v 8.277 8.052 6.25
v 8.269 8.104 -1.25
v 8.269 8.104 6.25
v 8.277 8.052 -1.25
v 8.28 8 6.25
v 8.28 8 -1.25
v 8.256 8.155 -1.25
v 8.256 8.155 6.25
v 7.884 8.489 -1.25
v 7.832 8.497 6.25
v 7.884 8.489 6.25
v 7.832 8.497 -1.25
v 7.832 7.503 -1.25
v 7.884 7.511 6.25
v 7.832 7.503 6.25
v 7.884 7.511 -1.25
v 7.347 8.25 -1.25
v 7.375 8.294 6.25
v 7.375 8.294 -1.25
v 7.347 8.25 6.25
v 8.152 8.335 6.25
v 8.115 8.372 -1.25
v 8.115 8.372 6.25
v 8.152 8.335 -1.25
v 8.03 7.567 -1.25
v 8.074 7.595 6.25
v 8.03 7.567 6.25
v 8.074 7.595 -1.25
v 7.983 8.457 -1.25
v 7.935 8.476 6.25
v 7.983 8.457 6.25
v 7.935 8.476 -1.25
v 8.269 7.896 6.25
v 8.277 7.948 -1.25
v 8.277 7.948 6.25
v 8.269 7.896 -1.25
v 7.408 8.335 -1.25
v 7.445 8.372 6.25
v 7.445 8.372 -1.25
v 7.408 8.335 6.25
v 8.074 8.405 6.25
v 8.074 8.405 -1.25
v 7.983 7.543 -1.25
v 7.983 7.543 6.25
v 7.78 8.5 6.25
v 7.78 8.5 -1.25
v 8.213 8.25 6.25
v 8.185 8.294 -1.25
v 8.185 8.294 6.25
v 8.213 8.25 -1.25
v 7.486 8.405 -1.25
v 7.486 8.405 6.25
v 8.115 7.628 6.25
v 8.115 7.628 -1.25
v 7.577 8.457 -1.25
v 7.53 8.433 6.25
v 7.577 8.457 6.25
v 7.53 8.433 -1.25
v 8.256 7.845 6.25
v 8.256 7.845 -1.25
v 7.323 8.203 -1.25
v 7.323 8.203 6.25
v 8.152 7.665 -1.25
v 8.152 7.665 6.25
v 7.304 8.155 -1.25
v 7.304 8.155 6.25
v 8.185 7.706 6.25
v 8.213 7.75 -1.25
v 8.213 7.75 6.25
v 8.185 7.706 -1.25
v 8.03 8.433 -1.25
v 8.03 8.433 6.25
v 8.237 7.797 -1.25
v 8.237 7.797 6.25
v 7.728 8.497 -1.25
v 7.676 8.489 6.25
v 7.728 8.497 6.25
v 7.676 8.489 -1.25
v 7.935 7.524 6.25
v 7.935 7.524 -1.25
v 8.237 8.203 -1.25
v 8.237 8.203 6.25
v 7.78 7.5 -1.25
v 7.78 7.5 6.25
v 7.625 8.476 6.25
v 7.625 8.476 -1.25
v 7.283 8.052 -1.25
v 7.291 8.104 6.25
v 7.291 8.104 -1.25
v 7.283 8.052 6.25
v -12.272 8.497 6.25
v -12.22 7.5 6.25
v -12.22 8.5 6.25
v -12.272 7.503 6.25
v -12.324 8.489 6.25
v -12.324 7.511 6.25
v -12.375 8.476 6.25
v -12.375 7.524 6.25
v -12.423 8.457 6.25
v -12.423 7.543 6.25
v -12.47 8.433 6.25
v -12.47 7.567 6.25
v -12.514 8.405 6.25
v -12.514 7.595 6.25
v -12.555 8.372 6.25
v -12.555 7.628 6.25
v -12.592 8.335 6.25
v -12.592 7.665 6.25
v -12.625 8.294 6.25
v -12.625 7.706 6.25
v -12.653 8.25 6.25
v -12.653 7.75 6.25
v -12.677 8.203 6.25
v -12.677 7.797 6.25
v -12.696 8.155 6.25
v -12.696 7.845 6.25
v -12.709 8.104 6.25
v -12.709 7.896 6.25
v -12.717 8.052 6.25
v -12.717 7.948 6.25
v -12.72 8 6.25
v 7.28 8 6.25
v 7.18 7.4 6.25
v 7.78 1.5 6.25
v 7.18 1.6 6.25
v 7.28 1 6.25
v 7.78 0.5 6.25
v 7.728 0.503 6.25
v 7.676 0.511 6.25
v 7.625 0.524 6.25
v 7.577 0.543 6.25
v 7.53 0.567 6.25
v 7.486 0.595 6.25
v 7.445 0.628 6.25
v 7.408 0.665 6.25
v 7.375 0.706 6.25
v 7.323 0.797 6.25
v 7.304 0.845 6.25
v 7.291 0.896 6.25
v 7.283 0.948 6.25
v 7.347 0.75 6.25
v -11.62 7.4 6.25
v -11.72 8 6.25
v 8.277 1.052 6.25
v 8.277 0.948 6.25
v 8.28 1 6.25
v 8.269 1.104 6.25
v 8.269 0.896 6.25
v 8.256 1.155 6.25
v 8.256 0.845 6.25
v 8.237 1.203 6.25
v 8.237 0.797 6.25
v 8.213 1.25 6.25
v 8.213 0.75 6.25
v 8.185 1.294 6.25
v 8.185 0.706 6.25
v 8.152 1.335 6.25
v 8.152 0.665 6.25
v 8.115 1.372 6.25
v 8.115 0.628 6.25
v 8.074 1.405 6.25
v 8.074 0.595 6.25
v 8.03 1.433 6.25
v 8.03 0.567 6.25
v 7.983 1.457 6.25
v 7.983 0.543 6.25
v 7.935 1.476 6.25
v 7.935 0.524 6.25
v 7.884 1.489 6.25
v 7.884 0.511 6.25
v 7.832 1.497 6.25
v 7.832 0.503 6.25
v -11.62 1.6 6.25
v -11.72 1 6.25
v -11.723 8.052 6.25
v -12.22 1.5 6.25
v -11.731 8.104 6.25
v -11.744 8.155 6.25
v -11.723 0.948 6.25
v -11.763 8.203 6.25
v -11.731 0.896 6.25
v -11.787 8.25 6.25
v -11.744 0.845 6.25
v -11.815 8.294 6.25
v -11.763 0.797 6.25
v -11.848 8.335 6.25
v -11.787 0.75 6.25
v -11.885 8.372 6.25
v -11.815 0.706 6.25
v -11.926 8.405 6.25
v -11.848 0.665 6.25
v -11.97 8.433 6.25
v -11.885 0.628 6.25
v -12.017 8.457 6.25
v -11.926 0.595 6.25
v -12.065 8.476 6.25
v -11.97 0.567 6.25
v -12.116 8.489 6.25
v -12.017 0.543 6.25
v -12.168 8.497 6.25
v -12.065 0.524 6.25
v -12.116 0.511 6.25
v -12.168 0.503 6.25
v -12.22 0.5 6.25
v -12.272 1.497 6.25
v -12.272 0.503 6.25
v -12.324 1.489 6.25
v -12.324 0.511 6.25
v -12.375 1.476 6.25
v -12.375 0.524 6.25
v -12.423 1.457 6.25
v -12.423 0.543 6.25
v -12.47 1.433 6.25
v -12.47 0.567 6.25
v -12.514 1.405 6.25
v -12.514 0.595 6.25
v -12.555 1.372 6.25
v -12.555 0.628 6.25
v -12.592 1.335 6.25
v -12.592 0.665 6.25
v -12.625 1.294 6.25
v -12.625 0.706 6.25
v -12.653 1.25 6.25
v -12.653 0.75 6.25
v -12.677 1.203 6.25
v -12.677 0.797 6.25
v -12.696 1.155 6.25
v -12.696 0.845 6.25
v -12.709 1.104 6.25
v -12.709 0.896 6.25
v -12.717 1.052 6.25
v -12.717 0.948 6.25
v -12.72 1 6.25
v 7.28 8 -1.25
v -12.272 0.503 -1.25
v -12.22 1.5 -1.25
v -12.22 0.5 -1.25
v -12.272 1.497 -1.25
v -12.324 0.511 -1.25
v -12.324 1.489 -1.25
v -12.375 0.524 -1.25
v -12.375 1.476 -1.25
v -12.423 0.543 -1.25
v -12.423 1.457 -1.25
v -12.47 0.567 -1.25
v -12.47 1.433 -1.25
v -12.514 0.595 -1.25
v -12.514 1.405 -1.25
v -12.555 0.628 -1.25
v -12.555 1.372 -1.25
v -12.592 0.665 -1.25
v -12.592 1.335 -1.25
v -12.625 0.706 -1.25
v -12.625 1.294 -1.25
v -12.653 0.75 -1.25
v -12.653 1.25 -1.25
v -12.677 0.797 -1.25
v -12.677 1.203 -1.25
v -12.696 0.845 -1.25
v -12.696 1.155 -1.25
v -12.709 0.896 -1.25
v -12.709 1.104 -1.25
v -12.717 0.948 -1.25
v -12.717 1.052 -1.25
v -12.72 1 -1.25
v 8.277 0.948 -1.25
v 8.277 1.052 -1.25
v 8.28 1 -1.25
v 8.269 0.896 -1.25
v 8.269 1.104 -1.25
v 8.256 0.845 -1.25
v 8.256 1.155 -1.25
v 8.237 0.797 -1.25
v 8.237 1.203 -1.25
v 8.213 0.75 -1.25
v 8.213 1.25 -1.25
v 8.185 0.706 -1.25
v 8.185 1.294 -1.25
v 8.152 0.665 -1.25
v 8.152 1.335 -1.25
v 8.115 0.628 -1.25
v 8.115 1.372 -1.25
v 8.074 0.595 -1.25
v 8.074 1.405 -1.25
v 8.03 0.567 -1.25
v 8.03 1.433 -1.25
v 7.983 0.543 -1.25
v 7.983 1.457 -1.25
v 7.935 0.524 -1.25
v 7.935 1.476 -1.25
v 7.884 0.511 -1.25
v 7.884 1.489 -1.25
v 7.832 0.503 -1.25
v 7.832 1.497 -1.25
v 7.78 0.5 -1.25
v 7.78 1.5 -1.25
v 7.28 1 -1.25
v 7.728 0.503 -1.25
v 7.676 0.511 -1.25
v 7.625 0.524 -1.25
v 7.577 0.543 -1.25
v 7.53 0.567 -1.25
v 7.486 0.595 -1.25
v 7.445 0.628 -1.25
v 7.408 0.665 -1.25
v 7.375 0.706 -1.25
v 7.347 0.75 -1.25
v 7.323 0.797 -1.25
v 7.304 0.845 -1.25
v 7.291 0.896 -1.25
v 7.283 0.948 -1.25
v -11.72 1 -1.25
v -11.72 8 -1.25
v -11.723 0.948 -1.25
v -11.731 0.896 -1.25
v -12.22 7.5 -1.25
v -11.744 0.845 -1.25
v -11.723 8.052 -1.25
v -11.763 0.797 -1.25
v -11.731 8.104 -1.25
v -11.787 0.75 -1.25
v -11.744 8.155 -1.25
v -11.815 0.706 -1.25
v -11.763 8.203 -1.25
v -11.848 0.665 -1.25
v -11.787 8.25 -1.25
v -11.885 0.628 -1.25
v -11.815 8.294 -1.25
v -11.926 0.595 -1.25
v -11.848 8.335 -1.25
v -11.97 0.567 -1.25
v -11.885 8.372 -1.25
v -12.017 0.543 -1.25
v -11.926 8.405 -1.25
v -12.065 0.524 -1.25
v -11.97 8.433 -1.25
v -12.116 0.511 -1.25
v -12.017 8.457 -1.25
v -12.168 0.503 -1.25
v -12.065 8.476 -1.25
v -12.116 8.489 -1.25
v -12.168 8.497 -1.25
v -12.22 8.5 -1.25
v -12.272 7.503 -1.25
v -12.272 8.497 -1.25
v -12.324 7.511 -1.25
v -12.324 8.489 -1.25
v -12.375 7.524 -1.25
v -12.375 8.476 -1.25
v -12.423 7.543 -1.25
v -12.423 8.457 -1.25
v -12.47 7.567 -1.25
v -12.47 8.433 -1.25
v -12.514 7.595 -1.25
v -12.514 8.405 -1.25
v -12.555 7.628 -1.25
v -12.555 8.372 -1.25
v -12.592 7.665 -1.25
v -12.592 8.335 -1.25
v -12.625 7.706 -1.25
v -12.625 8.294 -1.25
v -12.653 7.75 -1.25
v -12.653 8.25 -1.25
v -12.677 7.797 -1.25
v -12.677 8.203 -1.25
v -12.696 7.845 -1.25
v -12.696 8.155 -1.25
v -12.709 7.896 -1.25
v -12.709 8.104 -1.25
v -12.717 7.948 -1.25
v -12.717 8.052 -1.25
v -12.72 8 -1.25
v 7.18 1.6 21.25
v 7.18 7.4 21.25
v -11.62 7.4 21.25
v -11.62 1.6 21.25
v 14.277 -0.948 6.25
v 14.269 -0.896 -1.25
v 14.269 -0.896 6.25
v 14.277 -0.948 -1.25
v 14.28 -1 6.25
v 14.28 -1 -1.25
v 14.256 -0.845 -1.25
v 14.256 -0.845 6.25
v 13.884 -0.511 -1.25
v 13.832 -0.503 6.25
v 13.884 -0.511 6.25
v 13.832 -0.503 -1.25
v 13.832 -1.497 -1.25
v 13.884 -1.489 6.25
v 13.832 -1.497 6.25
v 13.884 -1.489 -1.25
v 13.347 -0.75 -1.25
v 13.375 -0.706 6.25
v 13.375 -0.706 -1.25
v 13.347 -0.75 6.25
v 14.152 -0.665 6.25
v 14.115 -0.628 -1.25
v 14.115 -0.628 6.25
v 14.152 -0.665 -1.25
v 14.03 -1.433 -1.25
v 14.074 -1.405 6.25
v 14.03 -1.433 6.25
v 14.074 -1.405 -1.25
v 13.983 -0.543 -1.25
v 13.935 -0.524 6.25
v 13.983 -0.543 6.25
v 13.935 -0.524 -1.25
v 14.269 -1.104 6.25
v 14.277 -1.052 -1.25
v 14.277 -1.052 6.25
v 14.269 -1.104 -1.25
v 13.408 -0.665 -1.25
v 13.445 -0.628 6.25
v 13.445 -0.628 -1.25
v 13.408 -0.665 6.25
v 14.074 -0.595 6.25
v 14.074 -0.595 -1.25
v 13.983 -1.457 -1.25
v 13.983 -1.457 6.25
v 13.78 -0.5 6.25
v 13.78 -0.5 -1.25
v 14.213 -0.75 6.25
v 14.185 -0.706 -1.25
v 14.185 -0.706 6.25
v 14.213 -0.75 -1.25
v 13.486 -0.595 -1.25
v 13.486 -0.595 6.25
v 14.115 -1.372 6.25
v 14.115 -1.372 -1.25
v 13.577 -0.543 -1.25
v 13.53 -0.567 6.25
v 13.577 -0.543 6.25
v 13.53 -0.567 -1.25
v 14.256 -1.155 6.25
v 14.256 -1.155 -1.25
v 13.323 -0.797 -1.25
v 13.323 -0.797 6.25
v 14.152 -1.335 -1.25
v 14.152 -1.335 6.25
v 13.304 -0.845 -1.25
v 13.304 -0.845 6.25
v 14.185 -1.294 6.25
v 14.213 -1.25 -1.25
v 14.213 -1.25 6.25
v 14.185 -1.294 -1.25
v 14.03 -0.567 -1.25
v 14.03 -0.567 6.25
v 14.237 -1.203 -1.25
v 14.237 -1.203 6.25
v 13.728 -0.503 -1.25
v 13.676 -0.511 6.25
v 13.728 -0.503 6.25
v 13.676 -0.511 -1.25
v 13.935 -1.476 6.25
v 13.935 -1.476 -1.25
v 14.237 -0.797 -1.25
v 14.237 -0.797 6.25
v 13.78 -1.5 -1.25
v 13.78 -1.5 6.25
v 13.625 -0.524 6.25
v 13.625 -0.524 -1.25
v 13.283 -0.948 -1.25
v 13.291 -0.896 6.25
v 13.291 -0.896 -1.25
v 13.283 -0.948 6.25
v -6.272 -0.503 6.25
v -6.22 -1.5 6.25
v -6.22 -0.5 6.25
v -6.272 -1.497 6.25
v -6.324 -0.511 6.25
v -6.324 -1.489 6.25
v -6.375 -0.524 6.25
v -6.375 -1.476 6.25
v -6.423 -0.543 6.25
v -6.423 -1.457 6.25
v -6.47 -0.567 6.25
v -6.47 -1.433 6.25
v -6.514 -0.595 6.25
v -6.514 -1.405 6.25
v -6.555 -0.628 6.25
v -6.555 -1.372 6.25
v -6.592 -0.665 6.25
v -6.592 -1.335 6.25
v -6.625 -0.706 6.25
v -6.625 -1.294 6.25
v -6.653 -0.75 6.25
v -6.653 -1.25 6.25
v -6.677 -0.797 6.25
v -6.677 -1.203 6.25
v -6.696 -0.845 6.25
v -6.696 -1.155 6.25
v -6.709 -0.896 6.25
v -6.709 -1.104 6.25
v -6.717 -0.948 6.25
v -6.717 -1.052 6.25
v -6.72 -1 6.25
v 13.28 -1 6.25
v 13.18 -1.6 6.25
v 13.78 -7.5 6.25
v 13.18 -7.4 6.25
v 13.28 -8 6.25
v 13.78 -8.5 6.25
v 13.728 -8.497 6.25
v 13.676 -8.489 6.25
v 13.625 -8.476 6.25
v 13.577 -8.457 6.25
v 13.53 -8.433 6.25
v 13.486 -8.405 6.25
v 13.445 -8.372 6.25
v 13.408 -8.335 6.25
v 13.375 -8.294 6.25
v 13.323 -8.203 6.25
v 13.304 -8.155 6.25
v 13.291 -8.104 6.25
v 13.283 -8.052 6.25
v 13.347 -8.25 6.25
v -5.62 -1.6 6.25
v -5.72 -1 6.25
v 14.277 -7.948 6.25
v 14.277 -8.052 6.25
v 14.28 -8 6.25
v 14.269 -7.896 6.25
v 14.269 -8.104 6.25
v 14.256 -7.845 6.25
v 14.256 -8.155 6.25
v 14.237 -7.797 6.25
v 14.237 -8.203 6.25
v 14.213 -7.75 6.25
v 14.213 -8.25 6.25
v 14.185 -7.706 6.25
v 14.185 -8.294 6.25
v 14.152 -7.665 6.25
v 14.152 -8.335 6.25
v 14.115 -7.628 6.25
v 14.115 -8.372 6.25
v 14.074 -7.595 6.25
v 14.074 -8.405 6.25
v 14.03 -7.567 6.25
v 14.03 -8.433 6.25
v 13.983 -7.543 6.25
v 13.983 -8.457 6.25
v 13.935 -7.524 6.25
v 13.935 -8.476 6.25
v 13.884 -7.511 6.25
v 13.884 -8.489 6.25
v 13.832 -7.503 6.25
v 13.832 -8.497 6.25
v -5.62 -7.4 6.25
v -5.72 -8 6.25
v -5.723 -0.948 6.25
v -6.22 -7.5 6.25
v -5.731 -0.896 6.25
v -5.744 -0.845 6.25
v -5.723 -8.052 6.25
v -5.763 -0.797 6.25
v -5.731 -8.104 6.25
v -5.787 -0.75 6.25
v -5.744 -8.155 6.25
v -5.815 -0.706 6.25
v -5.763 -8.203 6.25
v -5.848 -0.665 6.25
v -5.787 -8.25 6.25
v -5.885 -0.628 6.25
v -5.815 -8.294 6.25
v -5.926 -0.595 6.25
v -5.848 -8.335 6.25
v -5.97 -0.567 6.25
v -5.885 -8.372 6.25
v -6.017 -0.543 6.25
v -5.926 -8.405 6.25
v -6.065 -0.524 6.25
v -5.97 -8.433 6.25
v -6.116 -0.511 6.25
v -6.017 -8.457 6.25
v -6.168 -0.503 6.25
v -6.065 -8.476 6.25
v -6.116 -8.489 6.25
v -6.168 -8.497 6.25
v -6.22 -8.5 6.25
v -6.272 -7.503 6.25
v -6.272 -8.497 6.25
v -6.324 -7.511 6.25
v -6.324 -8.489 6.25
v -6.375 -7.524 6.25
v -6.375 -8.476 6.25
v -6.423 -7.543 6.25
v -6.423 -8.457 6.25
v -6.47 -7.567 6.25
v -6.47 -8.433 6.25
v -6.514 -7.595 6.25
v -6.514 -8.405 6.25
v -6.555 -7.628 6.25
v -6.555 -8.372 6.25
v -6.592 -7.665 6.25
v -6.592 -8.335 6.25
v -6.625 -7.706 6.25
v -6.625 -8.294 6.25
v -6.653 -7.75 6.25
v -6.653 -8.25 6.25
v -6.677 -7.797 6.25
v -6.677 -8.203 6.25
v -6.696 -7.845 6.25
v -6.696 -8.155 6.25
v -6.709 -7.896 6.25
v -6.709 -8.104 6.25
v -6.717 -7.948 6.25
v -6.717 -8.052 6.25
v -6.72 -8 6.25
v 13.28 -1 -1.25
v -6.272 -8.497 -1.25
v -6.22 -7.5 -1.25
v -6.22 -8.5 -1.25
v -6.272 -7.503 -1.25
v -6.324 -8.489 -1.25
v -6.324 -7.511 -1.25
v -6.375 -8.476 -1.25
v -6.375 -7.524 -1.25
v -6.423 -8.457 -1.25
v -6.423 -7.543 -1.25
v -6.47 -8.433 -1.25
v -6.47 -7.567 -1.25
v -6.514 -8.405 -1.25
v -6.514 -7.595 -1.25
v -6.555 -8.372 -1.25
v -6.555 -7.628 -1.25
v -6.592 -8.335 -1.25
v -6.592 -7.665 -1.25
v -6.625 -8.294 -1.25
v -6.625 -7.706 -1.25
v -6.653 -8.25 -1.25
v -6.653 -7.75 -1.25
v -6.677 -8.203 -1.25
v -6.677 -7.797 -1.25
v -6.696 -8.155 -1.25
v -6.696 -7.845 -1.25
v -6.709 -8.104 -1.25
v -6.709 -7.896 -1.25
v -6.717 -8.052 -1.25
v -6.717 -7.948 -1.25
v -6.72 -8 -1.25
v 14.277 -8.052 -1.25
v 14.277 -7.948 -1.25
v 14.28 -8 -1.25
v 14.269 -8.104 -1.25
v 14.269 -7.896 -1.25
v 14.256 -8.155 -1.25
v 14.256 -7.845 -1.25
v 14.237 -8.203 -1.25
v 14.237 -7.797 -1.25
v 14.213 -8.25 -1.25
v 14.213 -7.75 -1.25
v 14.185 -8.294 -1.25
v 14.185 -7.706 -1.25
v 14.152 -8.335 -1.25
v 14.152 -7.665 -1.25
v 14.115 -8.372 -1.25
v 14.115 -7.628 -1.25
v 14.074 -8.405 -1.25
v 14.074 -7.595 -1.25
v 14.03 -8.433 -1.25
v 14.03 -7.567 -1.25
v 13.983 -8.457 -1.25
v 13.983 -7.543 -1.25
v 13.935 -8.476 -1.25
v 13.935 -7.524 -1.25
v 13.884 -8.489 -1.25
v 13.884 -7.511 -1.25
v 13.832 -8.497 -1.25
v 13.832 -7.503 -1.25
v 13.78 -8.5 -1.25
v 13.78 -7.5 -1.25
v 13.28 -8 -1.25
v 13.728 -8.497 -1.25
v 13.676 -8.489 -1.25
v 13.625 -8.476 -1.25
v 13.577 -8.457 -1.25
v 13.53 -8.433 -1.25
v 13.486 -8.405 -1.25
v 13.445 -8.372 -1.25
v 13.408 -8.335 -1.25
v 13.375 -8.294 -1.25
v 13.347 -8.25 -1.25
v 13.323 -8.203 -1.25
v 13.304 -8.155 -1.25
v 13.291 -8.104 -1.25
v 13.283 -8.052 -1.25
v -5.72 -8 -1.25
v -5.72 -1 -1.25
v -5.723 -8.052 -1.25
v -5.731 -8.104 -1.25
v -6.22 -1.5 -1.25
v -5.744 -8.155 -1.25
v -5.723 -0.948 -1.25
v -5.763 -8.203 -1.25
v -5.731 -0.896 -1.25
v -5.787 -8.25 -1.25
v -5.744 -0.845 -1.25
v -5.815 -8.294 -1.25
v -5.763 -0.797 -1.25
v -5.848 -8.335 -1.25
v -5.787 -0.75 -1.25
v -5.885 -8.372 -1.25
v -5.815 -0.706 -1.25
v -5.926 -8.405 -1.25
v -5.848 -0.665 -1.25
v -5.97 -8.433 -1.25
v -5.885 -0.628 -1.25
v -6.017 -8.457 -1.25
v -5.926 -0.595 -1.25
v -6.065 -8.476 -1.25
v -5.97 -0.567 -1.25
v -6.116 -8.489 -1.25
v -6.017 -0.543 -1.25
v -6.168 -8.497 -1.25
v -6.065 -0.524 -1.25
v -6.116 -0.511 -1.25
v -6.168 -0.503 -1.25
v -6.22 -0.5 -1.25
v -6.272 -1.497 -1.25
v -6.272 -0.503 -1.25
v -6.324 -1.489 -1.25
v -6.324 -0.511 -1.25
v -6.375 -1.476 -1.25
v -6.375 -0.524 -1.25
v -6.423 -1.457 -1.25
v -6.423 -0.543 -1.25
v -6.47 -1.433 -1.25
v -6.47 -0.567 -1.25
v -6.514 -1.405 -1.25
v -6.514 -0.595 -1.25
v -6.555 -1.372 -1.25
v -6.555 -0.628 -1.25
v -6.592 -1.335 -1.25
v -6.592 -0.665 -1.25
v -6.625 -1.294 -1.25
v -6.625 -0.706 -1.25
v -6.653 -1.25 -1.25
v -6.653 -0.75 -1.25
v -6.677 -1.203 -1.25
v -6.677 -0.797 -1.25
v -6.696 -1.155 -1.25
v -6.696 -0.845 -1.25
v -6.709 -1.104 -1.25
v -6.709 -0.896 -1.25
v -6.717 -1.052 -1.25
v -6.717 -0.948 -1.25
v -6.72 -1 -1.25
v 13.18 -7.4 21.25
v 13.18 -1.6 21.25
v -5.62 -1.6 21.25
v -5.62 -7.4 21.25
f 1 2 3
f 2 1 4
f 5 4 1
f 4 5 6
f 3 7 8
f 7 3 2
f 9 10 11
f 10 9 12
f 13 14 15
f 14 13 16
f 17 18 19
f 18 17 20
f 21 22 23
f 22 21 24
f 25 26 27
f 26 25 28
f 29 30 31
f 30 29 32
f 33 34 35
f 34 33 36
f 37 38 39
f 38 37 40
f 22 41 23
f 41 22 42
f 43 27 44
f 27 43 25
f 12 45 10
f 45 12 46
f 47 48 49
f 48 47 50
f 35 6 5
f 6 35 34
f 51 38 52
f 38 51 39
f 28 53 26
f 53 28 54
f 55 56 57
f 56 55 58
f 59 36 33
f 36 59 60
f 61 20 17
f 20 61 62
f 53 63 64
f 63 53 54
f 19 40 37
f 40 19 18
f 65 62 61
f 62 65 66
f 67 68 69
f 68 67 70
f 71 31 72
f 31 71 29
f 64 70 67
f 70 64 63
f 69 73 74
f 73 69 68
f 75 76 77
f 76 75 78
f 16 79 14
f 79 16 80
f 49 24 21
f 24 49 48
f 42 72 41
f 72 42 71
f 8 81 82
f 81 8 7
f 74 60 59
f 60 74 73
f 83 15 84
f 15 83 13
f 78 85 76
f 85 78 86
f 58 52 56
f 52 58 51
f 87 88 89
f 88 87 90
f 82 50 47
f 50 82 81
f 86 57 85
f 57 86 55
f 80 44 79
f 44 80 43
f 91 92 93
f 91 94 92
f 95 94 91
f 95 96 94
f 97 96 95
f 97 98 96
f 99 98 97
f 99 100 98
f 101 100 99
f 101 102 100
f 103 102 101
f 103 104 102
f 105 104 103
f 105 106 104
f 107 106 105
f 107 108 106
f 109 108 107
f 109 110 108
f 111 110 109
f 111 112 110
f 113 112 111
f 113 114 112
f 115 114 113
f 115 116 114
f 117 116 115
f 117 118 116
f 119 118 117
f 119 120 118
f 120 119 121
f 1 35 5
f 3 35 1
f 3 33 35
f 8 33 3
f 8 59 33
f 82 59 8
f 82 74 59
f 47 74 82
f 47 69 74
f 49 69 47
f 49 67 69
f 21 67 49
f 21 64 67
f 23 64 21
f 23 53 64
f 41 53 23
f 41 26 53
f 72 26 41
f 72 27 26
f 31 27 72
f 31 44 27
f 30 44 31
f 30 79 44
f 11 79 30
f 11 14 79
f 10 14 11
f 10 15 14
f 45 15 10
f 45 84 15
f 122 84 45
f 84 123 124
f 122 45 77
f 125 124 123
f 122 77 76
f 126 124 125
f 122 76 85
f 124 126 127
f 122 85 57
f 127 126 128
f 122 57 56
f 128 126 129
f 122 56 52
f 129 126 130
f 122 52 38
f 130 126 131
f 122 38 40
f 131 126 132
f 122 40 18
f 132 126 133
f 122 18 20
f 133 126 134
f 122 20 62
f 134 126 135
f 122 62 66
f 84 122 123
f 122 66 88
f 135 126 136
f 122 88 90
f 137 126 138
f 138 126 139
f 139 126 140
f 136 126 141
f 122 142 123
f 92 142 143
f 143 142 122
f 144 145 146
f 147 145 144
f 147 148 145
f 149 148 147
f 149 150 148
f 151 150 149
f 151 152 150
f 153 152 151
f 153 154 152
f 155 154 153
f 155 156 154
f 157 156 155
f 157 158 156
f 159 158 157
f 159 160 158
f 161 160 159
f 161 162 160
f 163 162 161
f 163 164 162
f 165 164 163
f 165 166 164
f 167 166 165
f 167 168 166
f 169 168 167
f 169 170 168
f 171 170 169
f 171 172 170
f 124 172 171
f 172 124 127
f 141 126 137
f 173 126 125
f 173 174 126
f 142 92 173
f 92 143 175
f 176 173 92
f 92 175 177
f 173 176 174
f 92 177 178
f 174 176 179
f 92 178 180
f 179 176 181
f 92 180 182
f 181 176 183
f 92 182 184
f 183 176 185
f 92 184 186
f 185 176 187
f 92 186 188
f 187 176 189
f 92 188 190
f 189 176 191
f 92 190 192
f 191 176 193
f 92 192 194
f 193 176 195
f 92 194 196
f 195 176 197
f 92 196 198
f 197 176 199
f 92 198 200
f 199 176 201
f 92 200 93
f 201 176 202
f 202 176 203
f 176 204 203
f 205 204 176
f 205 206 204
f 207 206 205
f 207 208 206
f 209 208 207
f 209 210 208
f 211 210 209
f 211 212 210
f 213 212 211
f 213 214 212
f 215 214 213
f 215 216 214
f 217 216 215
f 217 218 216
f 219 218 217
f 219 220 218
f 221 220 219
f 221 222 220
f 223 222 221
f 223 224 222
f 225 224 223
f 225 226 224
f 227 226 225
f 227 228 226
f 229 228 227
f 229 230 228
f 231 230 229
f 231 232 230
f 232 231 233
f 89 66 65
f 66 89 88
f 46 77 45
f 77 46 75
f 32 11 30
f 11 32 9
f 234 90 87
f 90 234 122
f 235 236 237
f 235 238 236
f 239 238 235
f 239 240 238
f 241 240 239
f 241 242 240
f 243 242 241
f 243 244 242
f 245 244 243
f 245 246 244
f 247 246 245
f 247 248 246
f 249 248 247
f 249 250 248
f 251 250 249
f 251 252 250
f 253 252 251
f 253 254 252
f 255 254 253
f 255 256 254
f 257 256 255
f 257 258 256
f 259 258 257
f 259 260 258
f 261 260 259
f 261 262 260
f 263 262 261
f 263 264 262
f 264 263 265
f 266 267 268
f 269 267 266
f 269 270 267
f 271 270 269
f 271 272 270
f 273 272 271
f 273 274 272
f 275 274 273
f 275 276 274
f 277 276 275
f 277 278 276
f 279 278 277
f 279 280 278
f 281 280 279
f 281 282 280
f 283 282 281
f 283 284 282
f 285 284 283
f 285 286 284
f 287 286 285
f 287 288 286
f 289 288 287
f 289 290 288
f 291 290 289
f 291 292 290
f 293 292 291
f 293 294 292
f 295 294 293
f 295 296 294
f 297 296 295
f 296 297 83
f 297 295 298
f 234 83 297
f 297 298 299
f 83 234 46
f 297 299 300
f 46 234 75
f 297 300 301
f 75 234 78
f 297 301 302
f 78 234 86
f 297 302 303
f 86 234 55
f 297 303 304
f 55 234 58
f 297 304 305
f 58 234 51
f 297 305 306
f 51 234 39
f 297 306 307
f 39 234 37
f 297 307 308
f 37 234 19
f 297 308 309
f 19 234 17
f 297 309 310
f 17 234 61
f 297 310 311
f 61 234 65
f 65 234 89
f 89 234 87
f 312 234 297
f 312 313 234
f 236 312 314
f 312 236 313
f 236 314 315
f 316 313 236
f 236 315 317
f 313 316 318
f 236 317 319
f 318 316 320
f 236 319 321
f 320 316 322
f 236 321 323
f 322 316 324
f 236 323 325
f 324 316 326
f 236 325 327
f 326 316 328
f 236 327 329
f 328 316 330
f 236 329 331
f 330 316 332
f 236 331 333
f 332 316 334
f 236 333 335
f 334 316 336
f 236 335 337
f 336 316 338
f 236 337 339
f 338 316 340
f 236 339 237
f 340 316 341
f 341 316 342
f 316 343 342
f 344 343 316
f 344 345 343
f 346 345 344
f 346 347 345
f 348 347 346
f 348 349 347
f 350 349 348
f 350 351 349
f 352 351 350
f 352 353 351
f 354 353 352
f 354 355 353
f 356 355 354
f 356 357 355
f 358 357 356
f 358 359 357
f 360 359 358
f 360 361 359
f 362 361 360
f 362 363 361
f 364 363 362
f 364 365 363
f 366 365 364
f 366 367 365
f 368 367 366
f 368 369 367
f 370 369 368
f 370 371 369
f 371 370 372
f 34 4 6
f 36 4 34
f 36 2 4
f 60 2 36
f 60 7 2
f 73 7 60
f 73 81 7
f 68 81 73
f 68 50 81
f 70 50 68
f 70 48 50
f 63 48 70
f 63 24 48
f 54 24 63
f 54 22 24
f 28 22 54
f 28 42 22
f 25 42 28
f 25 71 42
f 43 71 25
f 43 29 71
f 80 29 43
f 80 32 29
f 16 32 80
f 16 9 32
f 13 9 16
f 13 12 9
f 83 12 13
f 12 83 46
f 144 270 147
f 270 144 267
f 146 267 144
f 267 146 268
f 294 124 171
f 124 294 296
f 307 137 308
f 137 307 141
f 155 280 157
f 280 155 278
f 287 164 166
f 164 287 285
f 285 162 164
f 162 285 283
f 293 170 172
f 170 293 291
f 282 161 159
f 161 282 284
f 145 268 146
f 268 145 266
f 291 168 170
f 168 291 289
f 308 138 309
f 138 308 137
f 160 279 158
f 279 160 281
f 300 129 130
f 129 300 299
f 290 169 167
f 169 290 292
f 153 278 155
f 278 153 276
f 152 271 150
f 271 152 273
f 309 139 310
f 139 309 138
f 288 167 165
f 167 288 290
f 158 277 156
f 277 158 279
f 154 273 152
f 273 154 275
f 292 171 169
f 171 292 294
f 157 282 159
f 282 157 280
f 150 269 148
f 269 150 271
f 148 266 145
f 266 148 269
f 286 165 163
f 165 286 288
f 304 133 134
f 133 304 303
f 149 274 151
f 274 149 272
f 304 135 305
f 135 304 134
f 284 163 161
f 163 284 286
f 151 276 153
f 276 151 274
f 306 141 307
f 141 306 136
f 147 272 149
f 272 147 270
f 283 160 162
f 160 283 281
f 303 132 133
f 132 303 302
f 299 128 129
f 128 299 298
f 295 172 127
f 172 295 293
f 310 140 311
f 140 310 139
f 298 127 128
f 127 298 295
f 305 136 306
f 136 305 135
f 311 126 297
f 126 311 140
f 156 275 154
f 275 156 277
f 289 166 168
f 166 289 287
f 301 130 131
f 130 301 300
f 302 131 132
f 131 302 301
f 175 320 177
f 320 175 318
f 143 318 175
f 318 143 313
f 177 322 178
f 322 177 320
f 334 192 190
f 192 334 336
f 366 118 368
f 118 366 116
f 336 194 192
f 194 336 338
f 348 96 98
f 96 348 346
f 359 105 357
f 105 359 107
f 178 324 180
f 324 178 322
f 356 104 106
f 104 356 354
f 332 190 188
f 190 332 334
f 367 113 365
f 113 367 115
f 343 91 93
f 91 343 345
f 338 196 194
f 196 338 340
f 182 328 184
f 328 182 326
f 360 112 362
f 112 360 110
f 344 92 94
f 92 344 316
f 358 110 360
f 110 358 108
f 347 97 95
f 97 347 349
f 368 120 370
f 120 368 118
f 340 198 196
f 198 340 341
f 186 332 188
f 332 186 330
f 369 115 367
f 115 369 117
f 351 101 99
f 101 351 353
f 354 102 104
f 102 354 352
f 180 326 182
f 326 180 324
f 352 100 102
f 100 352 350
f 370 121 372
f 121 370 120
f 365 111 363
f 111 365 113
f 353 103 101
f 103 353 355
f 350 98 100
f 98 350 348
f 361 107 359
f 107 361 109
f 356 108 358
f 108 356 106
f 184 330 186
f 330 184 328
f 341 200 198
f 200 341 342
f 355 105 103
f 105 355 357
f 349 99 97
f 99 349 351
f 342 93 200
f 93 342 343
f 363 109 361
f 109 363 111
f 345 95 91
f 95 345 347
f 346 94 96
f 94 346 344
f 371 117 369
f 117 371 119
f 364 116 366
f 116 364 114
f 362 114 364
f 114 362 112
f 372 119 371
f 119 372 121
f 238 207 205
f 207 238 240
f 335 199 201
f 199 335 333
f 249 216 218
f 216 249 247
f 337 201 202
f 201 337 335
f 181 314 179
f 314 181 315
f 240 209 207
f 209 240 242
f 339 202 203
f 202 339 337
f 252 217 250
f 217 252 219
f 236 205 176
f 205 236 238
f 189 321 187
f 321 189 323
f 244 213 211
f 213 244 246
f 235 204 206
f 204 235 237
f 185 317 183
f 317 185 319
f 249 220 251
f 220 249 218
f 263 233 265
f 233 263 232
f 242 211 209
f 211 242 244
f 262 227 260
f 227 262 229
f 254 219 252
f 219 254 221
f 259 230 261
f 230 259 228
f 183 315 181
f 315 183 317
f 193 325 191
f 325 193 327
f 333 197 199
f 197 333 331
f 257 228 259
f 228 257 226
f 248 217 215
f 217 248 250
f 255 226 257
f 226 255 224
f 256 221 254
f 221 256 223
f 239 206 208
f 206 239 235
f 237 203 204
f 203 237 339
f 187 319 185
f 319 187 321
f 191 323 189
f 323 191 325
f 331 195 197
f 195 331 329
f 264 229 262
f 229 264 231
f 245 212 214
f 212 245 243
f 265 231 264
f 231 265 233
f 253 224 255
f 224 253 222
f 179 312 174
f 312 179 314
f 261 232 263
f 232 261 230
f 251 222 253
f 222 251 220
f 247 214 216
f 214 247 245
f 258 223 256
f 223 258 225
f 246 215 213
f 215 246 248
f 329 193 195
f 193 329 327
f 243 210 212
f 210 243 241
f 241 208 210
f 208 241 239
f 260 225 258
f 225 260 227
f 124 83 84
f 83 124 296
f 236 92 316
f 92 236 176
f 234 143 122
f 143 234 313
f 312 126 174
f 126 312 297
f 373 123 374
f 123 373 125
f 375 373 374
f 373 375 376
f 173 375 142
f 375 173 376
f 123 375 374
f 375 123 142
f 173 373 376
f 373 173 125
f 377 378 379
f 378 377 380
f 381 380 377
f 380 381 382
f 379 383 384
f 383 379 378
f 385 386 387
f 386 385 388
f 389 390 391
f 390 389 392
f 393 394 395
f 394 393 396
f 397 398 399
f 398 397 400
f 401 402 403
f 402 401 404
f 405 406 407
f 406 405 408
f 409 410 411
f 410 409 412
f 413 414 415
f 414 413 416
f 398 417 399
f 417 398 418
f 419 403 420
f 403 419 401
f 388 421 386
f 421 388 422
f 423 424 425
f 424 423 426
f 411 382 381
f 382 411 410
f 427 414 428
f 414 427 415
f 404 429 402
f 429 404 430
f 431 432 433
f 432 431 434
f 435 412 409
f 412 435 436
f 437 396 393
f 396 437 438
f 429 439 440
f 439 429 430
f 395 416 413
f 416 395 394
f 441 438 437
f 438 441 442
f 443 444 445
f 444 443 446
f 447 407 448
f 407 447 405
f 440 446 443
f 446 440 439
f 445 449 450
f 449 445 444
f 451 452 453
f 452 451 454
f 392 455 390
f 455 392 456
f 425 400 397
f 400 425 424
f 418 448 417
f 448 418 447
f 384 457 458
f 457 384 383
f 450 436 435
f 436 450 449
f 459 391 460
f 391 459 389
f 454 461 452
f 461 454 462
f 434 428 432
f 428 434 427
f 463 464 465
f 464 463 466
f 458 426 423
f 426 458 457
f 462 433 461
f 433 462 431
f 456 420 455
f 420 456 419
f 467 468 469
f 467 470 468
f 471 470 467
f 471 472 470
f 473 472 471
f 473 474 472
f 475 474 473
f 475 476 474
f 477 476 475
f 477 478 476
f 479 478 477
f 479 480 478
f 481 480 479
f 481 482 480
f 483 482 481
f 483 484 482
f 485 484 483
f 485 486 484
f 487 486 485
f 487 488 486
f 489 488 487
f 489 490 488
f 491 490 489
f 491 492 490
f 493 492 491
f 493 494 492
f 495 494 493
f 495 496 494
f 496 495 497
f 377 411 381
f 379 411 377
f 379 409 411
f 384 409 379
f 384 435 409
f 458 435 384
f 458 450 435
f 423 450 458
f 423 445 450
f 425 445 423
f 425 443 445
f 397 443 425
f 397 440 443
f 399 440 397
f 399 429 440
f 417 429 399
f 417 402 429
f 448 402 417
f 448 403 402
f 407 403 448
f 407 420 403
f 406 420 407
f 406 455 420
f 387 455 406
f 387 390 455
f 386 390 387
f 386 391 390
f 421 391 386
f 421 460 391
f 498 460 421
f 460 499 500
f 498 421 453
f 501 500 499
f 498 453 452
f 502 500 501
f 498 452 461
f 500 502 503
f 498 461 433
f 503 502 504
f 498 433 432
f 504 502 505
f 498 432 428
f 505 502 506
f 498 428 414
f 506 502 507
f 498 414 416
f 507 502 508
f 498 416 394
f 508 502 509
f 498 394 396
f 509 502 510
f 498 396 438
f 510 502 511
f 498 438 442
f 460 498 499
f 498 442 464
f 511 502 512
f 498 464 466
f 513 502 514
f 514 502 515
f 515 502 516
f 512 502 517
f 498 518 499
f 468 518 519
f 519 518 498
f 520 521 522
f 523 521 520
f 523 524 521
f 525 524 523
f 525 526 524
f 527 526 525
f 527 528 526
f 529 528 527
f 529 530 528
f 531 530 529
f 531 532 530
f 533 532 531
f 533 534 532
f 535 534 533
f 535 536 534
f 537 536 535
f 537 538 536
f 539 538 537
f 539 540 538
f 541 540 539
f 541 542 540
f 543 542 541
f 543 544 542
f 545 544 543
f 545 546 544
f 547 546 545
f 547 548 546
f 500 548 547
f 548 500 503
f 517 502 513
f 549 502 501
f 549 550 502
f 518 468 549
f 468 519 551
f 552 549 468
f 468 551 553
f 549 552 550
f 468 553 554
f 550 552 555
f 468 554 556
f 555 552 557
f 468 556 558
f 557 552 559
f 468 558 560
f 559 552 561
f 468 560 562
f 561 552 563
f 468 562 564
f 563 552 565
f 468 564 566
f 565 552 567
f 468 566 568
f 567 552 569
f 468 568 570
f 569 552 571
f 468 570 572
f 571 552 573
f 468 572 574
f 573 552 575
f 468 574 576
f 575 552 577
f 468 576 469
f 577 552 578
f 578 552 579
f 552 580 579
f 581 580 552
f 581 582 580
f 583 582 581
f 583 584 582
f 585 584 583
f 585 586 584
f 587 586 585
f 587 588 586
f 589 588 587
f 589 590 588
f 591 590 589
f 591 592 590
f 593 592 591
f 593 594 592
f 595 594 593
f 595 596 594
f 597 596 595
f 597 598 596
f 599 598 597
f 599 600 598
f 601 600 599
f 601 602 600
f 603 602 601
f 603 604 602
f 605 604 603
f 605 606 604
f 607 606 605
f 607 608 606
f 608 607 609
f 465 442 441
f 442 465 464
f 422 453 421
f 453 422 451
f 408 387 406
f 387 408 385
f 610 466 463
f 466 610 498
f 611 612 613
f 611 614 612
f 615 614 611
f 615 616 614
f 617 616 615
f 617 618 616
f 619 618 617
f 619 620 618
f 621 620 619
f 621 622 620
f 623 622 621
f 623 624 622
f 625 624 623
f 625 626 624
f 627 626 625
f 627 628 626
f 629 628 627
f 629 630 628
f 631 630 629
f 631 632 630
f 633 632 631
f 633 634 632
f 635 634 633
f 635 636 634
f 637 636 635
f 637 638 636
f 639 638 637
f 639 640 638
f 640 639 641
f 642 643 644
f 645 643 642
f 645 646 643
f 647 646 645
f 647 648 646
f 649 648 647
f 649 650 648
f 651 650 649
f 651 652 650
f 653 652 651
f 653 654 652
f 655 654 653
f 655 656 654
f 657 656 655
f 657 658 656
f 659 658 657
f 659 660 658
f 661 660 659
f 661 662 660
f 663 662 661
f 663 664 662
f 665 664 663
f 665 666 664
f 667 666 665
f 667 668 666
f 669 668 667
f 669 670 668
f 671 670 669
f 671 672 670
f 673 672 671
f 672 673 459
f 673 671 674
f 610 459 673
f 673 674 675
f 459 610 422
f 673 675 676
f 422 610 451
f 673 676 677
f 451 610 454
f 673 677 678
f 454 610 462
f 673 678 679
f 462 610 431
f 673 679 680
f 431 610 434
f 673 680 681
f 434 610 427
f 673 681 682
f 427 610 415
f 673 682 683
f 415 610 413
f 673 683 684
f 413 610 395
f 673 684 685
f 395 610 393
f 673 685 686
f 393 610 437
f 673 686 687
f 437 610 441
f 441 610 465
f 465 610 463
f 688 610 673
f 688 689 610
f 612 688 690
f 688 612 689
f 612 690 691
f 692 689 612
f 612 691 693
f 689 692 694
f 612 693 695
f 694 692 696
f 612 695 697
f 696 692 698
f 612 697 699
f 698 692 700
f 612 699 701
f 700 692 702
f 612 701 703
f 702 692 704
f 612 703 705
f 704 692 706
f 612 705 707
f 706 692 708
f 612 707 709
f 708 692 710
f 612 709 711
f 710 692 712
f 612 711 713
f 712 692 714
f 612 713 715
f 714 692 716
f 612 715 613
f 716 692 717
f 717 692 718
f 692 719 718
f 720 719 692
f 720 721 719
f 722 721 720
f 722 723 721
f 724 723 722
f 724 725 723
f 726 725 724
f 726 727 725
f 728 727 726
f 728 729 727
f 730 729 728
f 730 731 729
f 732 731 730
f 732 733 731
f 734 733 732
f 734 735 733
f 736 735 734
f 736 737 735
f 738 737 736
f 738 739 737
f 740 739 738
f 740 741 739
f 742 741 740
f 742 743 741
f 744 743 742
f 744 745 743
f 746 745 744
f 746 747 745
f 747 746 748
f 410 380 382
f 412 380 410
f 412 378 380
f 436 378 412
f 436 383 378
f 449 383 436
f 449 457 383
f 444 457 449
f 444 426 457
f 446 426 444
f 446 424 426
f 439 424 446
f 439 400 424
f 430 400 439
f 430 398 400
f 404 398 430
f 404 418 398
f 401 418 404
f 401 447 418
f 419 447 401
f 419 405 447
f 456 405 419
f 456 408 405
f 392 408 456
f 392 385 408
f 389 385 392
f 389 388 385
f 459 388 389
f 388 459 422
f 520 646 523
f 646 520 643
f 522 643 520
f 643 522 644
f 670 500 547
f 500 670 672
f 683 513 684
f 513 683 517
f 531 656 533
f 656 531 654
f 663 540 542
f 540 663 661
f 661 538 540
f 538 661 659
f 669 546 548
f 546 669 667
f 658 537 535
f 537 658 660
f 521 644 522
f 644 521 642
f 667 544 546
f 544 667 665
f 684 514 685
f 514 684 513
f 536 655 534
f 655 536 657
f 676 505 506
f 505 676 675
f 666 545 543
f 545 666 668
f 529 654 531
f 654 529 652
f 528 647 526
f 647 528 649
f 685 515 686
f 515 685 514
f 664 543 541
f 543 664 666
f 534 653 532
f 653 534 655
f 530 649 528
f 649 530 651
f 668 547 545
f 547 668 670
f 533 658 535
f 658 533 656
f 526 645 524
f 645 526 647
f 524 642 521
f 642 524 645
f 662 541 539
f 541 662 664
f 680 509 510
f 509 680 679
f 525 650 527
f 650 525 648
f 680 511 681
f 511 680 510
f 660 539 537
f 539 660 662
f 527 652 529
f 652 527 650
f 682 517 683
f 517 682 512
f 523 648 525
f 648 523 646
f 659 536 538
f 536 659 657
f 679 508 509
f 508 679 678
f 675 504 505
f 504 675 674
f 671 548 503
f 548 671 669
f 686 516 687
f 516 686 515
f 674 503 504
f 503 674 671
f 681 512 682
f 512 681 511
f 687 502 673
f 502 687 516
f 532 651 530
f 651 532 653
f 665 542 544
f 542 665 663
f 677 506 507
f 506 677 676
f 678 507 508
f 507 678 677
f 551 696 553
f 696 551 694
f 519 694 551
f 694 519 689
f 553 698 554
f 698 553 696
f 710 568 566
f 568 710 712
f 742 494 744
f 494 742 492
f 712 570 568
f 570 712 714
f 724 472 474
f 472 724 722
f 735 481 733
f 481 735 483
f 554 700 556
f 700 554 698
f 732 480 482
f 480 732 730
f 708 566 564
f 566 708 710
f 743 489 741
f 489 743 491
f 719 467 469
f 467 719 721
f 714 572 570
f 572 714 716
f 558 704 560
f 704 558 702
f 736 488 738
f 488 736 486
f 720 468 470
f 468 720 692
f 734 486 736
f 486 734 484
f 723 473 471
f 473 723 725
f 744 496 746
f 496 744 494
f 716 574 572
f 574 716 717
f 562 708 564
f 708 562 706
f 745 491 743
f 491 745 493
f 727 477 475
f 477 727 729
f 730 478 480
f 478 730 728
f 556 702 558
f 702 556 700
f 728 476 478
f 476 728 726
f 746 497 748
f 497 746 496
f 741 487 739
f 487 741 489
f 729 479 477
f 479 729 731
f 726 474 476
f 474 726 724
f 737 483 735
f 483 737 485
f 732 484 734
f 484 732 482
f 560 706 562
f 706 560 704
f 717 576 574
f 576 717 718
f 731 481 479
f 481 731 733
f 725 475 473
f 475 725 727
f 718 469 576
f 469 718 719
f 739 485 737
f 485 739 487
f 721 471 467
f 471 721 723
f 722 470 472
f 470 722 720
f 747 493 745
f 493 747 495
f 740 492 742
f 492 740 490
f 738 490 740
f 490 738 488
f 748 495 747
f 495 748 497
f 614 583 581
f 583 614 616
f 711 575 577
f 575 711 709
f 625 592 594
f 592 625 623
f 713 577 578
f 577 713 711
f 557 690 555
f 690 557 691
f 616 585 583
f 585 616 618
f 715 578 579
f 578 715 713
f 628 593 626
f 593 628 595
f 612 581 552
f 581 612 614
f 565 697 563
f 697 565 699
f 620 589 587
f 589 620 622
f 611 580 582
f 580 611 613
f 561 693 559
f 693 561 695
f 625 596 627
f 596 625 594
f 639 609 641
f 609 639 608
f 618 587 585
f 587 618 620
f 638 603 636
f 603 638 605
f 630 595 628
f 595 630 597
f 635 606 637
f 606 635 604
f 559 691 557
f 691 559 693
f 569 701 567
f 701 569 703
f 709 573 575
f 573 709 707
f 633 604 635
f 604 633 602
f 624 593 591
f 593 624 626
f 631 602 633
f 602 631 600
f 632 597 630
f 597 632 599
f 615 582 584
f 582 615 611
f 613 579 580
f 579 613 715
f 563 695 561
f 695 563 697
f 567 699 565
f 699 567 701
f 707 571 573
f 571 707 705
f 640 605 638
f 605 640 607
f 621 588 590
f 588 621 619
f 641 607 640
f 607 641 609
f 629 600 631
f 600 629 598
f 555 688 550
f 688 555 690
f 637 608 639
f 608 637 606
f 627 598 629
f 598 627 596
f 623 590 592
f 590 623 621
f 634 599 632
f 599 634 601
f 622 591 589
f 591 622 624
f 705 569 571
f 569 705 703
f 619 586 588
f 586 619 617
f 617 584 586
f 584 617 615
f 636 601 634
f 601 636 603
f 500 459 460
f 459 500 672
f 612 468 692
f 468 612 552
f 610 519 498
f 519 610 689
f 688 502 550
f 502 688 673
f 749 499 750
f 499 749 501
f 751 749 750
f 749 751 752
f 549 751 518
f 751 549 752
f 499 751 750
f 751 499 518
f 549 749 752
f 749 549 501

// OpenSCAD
$fn = 60;


fuseHolderWidth = 20;
fuseHolderDepth = 7;
fuseHolderHeight = 7.5 ;

blankHoleOffsetX = 1;
blankHoleOffsetY = 1;

boltHole = 3.6;

cableDiamiter = 3.3;

perfBoardSpacing=2.54;
perfBoardSpacesDepth=8;
perfBoardSpacesWide=14;

boltHolsWidth = perfBoardSpacing * perfBoardSpacesWide;
boltHolsDepth = perfBoardSpacing * perfBoardSpacesDepth;

baseHolderWidth = boltHolsWidth + 6; //40;
baseHolderDepth = boltHolsDepth + 6; //23;

baseHolderHeight = fuseHolderHeight + 1;

//color("grey",.5)
//translate([0,0,10]) top();

//color("grey",.5)
//bottom();

//color("grey",.5)
//translate([0,0,-6]) legs();

//holderBlock("c");

bottomFuseCutouts();

////////////////////////////////////////////////////////////////////////////////////////////////////
module legs(){

	legHeigth = 17;
	legWidth = 6;
	legTopHeigth = 4;
	footWidth = 16;
	footHeigth = 4;
	footDepth =14;

		
	difference(){
		union(){
			plate4Point(baseHolderWidth,baseHolderDepth,legTopHeigth,4);   // Top Plate
				
			translate([0, (-1*(footDepth/3))+.1, -1*((legHeigth)-(footHeigth))])
				plate4Point(baseHolderWidth, footDepth, legTopHeigth, 6);   // foot

			difference(){
				for(a=[1,-1]){
					difference(){
						translate([a*(baseHolderWidth-legWidth)/2, 0, -1*(legHeigth/2)+(legTopHeigth/2)])
							plate2Point(baseHolderDepth,legHeigth,legWidth);   // Leg
					}
				}
//				translate([0,10.5,-13])
//					rotate([0,90,0])
//					scale([1.5,.8,1])
//					cylinder(d=20.2, h=baseHolderWidth+5, center=true);
				}
		}
		translate([0,5,0])																								// Top Cutout
			plate4Point(baseHolderWidth-12,baseHolderDepth+20,legTopHeigth+1,4);

		rotate([0,0,90])																									// Screw slot
			translate([-(baseHolderWidth-footWidth-15)/2, 0, 2])
			screwSlot(12, 5.5, baseHolderWidth-4-legWidth*2);
			
		for(a = [[1,1],[-1,1],[1,-1],[-1,-1]]){
			translate([																											// Corner Hole
				a[0]*((baseHolderWidth/2)-(4/2)-blankHoleOffsetX),
				a[1]*((baseHolderDepth/2)-(4/2)-blankHoleOffsetY),
				0])
				cylinder(d=boltHole, h=20, center=true);
			translate([																											// Nutt Slot
				a[0]*((baseHolderWidth/2)-(4/2)-blankHoleOffsetX),
				a[1]*((baseHolderDepth/2)-(4/2)-blankHoleOffsetY),
				-3.5]) // nut slot
				rotate([0,0,90])
				nuttSlot();
		}

		translate([0,-9.5,-7.5])
		 cube([50,9,7],center=true);
			
		translate([0,7.45,-12])
			cube([baseHolderWidth+5,10,30],center=true);

	}
}
////////////////////////////////////////////////////////////////////////////////////////////////////
module bottom(){
	difference(){
		union(){
			plate4Point(baseHolderWidth,baseHolderDepth,(baseHolderHeight/2)+1,4);
      cableSupport();
      }
      cableSupportDel();
   translate([0,0,5.25])																	              // Cut Support Flat Top
      plate4Point(baseHolderWidth+20,baseHolderDepth+10,(baseHolderHeight/2)+1,5);
    
    translate([0,0,-4.75])																	            // Cut Support Flat BotTOM
      plate4Point(baseHolderWidth+20,baseHolderDepth+10,(baseHolderHeight/2)+1,5);
    
      bottomFuseCutouts();
      boltHolesCorners();
	}
  
		for(a = [[-1,0],[1,0]]){
			translate([																											// Line up bumps
				a[0]*((baseHolderWidth/2)-(4/2)-blankHoleOffsetX),
				a[1]*((baseHolderDepth/2)-(4/2)-blankHoleOffsetY),
				(baseHolderHeight/4)])
				sphere(d=boltHole-1);
		}
    cableSupportAdd();

  }
////////////////////////////////////////////////////////////////////////////////////////////////////
module top(){
	difference(){
		plate4Point(baseHolderWidth,baseHolderDepth,baseHolderHeight,4);
		translate([0,0,(-(baseHolderHeight - fuseHolderHeight)/2)-2.6])
      bottomFuseCutouts();
//		translate([
//      (baseHolderWidth/2)-(fuseHolderWidth)-3,
//      -(baseHolderDepth/2)+(fuseHolderDepth*2.3),
//      (-(baseHolderHeight - fuseHolderHeight)/2)-.1
//    ])
//			holderBlock("c");
//		translate([(baseHolderWidth/2)-(fuseHolderWidth/2)-7,-(baseHolderDepth/2)+(fuseHolderDepth),(-(baseHolderHeight - fuseHolderHeight)/2)-.1])
//			holderBlock("c");
      boltHolesCorners();
		for(a = [[-1,0],[1,0]]){
			translate([																											// Center Hole
				a[0]*((baseHolderWidth/2)-(4/2)-blankHoleOffsetX),
				a[1]*((baseHolderDepth/2)-(4/2)-blankHoleOffsetY),
				-2])
				cylinder(d=boltHole, h=5, center=true);
			
		}
	}
}
////////////////////////////////////////////////////////////////////////////////////////////////////
module holderBlock(inType="m"){

	wallThickness = 1.2;
	
	feetWidth = 1.62;
	feetDepth = .38;
	feetHeight = 2.45;
	
	if(inType == "m"){
		difference(){
			cube([fuseHolderWidth,fuseHolderDepth,fuseHolderHeight],center=true);
			translate([0,0,wallThickness])
				cube([fuseHolderWidth-(wallThickness*2),fuseHolderDepth-(wallThickness*2),fuseHolderHeight],center=true);
		}
	} else {
		union(){
			cube([fuseHolderWidth,fuseHolderDepth,fuseHolderHeight],center=true);
      for(a=[[1,1],[1,-1],[-1,1],[-1,-1]]){
        translate([
          a[0]*(fuseHolderWidth)/2,
          a[1]*(fuseHolderDepth)/2,
          0
        ])
          cylinder(d=1,h=fuseHolderHeight,center=true);
      }
		}
		translate([0,0,10])
			cube([fuseHolderWidth-(wallThickness),fuseHolderDepth-(wallThickness),fuseHolderHeight+10],center=true);
	}
	
}
////////////////////////////////////////////////////////////////////////////////////////////////////
module plate4Point(x,y,z,d){
	hull(){
		color("green") translate([(x/2)-(d/2) ,(y/2) -(d/2),0]) cylinder(h=z, d=d, center=true);
		color("blue")  translate([(x/2)-(d/2) ,-(y/2)+(d/2),0]) cylinder(h=z, d=d, center=true);
		color("red")   translate([-(x/2)+(d/2),(y/2) -(d/2),0]) cylinder(h=z, d=d, center=true);
		color("grey")  translate([-(x/2)+(d/2),-(y/2)+(d/2),0]) cylinder(h=z, d=d, center=true);
	}
}
////////////////////////////////////////////////////////////////////////////////////////////////////
module plate2Point(y,z,d){
	hull(){
		color("green") translate([0 ,(y/2) -(d/2),0]) cylinder(h=z, d=d, center=true);
		color("blue")  translate([0 ,-(y/2)+(d/2),0]) cylinder(h=z, d=d, center=true);
	}
}
////////////////////////////////////////////////////////////////////////////////////////////////////
module screwCutOut(headDiamitor, shaftDiamitor){

	cylinder(h=10, d=headDiamitor, center=true);
	translate([0,0,-9])
		cylinder(h=10, d=shaftDiamitor, center=true);

}
////////////////////////////////////////////////////////////////////////////////////////////////////
module screwSlot(headDiamitor, shaftDiamitor, slotWidth){

	plate2Point(slotWidth,30,headDiamitor);
	translate([0,0,-9])
		plate2Point(slotWidth-shaftDiamitor,20,shaftDiamitor);

}
////////////////////////////////////////////////////////////////////////////////////////////////////
module nuttSlot(){
	cube([7,20,3],center=true);
}
////////////////////////////////////////////////////////////////////////////////////////////////////
module boltHolesCorners(){
	for(a = [[1,1],[-1,1],[1,-1],[-1,-1]]){
		translate([
			a[1]*((boltHolsWidth/2)),
			a[0]*((boltHolsDepth/2)),
			0])
			cylinder(d=boltHole, h=20, center=true);
	}
}
////////////////////////////////////////////////////////////////////////////////////////////////////
module cableSupport(){
  difference(){
    for(b=[1,-1]){
      hull(){
        translate([0,b*4.5,0])															// Strap Support
            rotate([0,90,0])
            cylinder(d=cableDiamiter*2, h=baseHolderWidth+18, center=true);
        translate([0,b*4.5,3])															// Strap Support
            rotate([0,90,0])
            cylinder(d=cableDiamiter*2, h=baseHolderWidth+18, center=true);
      }
    }
  	for(b=[1,-1]){
			translate([((baseHolderWidth/2)+5),b*4.5,5])					// Strap Cutout Top
				cube([4,10,10],center=true);
			translate([-((baseHolderWidth/2)+5),b*4.5,5])					// Strap Cutout Top
				cube([4,10,10],center=true);
      }
    }
}
////////////////////////////////////////////////////////////////////////////////////////////////////
module cableSupportAdd(){
    translate([(                                                        // Center fuse seperator
       baseHolderWidth/2)-(fuseHolderWidth)-3,
      -(baseHolderDepth/2)+(fuseHolderDepth*2.5),
      (-(baseHolderHeight - fuseHolderHeight)/2)+.87
      ]) color("Chartreuse")
        cube([3,fuseHolderDepth+1,baseHolderHeight-4],center=true);
    translate([(
      baseHolderWidth/2)-(fuseHolderWidth/2)-7,
      -(baseHolderDepth/2)+(fuseHolderDepth)+1.6,
      (-(baseHolderHeight - fuseHolderHeight)/2)+.87
      ]) color("GreenYellow")
        cube([3,fuseHolderDepth+1,baseHolderHeight-4],center=true);
}
////////////////////////////////////////////////////////////////////////////////////////////////////
module cableSupportDel(){
  for(a=[[1,3],[-1,-3]]){                                            // cable openings
		hull(){
			translate([0,a[0]*4.5,.5])
				rotate([0,90,0])
				cylinder(d=cableDiamiter, h=baseHolderWidth+20, center=true);
			translate([0,a[0]*4.5,5])
				rotate([0,90,0])
				cylinder(d=cableDiamiter, h=baseHolderWidth+20, center=true);
		}
 	}
}
////////////////////////////////////////////////////////////////////////////////////////////////////
module bottomFuseCutouts(){
  for(a=[[1,3],[-1,-3]]){                                             // Fuse cutouts
		translate([
      (baseHolderWidth/2)-(fuseHolderWidth)-a[1],
      a[0]*4.5,
      (-(baseHolderHeight - fuseHolderHeight)/2)+3
      ])
      holderBlock("c");
  }
}
